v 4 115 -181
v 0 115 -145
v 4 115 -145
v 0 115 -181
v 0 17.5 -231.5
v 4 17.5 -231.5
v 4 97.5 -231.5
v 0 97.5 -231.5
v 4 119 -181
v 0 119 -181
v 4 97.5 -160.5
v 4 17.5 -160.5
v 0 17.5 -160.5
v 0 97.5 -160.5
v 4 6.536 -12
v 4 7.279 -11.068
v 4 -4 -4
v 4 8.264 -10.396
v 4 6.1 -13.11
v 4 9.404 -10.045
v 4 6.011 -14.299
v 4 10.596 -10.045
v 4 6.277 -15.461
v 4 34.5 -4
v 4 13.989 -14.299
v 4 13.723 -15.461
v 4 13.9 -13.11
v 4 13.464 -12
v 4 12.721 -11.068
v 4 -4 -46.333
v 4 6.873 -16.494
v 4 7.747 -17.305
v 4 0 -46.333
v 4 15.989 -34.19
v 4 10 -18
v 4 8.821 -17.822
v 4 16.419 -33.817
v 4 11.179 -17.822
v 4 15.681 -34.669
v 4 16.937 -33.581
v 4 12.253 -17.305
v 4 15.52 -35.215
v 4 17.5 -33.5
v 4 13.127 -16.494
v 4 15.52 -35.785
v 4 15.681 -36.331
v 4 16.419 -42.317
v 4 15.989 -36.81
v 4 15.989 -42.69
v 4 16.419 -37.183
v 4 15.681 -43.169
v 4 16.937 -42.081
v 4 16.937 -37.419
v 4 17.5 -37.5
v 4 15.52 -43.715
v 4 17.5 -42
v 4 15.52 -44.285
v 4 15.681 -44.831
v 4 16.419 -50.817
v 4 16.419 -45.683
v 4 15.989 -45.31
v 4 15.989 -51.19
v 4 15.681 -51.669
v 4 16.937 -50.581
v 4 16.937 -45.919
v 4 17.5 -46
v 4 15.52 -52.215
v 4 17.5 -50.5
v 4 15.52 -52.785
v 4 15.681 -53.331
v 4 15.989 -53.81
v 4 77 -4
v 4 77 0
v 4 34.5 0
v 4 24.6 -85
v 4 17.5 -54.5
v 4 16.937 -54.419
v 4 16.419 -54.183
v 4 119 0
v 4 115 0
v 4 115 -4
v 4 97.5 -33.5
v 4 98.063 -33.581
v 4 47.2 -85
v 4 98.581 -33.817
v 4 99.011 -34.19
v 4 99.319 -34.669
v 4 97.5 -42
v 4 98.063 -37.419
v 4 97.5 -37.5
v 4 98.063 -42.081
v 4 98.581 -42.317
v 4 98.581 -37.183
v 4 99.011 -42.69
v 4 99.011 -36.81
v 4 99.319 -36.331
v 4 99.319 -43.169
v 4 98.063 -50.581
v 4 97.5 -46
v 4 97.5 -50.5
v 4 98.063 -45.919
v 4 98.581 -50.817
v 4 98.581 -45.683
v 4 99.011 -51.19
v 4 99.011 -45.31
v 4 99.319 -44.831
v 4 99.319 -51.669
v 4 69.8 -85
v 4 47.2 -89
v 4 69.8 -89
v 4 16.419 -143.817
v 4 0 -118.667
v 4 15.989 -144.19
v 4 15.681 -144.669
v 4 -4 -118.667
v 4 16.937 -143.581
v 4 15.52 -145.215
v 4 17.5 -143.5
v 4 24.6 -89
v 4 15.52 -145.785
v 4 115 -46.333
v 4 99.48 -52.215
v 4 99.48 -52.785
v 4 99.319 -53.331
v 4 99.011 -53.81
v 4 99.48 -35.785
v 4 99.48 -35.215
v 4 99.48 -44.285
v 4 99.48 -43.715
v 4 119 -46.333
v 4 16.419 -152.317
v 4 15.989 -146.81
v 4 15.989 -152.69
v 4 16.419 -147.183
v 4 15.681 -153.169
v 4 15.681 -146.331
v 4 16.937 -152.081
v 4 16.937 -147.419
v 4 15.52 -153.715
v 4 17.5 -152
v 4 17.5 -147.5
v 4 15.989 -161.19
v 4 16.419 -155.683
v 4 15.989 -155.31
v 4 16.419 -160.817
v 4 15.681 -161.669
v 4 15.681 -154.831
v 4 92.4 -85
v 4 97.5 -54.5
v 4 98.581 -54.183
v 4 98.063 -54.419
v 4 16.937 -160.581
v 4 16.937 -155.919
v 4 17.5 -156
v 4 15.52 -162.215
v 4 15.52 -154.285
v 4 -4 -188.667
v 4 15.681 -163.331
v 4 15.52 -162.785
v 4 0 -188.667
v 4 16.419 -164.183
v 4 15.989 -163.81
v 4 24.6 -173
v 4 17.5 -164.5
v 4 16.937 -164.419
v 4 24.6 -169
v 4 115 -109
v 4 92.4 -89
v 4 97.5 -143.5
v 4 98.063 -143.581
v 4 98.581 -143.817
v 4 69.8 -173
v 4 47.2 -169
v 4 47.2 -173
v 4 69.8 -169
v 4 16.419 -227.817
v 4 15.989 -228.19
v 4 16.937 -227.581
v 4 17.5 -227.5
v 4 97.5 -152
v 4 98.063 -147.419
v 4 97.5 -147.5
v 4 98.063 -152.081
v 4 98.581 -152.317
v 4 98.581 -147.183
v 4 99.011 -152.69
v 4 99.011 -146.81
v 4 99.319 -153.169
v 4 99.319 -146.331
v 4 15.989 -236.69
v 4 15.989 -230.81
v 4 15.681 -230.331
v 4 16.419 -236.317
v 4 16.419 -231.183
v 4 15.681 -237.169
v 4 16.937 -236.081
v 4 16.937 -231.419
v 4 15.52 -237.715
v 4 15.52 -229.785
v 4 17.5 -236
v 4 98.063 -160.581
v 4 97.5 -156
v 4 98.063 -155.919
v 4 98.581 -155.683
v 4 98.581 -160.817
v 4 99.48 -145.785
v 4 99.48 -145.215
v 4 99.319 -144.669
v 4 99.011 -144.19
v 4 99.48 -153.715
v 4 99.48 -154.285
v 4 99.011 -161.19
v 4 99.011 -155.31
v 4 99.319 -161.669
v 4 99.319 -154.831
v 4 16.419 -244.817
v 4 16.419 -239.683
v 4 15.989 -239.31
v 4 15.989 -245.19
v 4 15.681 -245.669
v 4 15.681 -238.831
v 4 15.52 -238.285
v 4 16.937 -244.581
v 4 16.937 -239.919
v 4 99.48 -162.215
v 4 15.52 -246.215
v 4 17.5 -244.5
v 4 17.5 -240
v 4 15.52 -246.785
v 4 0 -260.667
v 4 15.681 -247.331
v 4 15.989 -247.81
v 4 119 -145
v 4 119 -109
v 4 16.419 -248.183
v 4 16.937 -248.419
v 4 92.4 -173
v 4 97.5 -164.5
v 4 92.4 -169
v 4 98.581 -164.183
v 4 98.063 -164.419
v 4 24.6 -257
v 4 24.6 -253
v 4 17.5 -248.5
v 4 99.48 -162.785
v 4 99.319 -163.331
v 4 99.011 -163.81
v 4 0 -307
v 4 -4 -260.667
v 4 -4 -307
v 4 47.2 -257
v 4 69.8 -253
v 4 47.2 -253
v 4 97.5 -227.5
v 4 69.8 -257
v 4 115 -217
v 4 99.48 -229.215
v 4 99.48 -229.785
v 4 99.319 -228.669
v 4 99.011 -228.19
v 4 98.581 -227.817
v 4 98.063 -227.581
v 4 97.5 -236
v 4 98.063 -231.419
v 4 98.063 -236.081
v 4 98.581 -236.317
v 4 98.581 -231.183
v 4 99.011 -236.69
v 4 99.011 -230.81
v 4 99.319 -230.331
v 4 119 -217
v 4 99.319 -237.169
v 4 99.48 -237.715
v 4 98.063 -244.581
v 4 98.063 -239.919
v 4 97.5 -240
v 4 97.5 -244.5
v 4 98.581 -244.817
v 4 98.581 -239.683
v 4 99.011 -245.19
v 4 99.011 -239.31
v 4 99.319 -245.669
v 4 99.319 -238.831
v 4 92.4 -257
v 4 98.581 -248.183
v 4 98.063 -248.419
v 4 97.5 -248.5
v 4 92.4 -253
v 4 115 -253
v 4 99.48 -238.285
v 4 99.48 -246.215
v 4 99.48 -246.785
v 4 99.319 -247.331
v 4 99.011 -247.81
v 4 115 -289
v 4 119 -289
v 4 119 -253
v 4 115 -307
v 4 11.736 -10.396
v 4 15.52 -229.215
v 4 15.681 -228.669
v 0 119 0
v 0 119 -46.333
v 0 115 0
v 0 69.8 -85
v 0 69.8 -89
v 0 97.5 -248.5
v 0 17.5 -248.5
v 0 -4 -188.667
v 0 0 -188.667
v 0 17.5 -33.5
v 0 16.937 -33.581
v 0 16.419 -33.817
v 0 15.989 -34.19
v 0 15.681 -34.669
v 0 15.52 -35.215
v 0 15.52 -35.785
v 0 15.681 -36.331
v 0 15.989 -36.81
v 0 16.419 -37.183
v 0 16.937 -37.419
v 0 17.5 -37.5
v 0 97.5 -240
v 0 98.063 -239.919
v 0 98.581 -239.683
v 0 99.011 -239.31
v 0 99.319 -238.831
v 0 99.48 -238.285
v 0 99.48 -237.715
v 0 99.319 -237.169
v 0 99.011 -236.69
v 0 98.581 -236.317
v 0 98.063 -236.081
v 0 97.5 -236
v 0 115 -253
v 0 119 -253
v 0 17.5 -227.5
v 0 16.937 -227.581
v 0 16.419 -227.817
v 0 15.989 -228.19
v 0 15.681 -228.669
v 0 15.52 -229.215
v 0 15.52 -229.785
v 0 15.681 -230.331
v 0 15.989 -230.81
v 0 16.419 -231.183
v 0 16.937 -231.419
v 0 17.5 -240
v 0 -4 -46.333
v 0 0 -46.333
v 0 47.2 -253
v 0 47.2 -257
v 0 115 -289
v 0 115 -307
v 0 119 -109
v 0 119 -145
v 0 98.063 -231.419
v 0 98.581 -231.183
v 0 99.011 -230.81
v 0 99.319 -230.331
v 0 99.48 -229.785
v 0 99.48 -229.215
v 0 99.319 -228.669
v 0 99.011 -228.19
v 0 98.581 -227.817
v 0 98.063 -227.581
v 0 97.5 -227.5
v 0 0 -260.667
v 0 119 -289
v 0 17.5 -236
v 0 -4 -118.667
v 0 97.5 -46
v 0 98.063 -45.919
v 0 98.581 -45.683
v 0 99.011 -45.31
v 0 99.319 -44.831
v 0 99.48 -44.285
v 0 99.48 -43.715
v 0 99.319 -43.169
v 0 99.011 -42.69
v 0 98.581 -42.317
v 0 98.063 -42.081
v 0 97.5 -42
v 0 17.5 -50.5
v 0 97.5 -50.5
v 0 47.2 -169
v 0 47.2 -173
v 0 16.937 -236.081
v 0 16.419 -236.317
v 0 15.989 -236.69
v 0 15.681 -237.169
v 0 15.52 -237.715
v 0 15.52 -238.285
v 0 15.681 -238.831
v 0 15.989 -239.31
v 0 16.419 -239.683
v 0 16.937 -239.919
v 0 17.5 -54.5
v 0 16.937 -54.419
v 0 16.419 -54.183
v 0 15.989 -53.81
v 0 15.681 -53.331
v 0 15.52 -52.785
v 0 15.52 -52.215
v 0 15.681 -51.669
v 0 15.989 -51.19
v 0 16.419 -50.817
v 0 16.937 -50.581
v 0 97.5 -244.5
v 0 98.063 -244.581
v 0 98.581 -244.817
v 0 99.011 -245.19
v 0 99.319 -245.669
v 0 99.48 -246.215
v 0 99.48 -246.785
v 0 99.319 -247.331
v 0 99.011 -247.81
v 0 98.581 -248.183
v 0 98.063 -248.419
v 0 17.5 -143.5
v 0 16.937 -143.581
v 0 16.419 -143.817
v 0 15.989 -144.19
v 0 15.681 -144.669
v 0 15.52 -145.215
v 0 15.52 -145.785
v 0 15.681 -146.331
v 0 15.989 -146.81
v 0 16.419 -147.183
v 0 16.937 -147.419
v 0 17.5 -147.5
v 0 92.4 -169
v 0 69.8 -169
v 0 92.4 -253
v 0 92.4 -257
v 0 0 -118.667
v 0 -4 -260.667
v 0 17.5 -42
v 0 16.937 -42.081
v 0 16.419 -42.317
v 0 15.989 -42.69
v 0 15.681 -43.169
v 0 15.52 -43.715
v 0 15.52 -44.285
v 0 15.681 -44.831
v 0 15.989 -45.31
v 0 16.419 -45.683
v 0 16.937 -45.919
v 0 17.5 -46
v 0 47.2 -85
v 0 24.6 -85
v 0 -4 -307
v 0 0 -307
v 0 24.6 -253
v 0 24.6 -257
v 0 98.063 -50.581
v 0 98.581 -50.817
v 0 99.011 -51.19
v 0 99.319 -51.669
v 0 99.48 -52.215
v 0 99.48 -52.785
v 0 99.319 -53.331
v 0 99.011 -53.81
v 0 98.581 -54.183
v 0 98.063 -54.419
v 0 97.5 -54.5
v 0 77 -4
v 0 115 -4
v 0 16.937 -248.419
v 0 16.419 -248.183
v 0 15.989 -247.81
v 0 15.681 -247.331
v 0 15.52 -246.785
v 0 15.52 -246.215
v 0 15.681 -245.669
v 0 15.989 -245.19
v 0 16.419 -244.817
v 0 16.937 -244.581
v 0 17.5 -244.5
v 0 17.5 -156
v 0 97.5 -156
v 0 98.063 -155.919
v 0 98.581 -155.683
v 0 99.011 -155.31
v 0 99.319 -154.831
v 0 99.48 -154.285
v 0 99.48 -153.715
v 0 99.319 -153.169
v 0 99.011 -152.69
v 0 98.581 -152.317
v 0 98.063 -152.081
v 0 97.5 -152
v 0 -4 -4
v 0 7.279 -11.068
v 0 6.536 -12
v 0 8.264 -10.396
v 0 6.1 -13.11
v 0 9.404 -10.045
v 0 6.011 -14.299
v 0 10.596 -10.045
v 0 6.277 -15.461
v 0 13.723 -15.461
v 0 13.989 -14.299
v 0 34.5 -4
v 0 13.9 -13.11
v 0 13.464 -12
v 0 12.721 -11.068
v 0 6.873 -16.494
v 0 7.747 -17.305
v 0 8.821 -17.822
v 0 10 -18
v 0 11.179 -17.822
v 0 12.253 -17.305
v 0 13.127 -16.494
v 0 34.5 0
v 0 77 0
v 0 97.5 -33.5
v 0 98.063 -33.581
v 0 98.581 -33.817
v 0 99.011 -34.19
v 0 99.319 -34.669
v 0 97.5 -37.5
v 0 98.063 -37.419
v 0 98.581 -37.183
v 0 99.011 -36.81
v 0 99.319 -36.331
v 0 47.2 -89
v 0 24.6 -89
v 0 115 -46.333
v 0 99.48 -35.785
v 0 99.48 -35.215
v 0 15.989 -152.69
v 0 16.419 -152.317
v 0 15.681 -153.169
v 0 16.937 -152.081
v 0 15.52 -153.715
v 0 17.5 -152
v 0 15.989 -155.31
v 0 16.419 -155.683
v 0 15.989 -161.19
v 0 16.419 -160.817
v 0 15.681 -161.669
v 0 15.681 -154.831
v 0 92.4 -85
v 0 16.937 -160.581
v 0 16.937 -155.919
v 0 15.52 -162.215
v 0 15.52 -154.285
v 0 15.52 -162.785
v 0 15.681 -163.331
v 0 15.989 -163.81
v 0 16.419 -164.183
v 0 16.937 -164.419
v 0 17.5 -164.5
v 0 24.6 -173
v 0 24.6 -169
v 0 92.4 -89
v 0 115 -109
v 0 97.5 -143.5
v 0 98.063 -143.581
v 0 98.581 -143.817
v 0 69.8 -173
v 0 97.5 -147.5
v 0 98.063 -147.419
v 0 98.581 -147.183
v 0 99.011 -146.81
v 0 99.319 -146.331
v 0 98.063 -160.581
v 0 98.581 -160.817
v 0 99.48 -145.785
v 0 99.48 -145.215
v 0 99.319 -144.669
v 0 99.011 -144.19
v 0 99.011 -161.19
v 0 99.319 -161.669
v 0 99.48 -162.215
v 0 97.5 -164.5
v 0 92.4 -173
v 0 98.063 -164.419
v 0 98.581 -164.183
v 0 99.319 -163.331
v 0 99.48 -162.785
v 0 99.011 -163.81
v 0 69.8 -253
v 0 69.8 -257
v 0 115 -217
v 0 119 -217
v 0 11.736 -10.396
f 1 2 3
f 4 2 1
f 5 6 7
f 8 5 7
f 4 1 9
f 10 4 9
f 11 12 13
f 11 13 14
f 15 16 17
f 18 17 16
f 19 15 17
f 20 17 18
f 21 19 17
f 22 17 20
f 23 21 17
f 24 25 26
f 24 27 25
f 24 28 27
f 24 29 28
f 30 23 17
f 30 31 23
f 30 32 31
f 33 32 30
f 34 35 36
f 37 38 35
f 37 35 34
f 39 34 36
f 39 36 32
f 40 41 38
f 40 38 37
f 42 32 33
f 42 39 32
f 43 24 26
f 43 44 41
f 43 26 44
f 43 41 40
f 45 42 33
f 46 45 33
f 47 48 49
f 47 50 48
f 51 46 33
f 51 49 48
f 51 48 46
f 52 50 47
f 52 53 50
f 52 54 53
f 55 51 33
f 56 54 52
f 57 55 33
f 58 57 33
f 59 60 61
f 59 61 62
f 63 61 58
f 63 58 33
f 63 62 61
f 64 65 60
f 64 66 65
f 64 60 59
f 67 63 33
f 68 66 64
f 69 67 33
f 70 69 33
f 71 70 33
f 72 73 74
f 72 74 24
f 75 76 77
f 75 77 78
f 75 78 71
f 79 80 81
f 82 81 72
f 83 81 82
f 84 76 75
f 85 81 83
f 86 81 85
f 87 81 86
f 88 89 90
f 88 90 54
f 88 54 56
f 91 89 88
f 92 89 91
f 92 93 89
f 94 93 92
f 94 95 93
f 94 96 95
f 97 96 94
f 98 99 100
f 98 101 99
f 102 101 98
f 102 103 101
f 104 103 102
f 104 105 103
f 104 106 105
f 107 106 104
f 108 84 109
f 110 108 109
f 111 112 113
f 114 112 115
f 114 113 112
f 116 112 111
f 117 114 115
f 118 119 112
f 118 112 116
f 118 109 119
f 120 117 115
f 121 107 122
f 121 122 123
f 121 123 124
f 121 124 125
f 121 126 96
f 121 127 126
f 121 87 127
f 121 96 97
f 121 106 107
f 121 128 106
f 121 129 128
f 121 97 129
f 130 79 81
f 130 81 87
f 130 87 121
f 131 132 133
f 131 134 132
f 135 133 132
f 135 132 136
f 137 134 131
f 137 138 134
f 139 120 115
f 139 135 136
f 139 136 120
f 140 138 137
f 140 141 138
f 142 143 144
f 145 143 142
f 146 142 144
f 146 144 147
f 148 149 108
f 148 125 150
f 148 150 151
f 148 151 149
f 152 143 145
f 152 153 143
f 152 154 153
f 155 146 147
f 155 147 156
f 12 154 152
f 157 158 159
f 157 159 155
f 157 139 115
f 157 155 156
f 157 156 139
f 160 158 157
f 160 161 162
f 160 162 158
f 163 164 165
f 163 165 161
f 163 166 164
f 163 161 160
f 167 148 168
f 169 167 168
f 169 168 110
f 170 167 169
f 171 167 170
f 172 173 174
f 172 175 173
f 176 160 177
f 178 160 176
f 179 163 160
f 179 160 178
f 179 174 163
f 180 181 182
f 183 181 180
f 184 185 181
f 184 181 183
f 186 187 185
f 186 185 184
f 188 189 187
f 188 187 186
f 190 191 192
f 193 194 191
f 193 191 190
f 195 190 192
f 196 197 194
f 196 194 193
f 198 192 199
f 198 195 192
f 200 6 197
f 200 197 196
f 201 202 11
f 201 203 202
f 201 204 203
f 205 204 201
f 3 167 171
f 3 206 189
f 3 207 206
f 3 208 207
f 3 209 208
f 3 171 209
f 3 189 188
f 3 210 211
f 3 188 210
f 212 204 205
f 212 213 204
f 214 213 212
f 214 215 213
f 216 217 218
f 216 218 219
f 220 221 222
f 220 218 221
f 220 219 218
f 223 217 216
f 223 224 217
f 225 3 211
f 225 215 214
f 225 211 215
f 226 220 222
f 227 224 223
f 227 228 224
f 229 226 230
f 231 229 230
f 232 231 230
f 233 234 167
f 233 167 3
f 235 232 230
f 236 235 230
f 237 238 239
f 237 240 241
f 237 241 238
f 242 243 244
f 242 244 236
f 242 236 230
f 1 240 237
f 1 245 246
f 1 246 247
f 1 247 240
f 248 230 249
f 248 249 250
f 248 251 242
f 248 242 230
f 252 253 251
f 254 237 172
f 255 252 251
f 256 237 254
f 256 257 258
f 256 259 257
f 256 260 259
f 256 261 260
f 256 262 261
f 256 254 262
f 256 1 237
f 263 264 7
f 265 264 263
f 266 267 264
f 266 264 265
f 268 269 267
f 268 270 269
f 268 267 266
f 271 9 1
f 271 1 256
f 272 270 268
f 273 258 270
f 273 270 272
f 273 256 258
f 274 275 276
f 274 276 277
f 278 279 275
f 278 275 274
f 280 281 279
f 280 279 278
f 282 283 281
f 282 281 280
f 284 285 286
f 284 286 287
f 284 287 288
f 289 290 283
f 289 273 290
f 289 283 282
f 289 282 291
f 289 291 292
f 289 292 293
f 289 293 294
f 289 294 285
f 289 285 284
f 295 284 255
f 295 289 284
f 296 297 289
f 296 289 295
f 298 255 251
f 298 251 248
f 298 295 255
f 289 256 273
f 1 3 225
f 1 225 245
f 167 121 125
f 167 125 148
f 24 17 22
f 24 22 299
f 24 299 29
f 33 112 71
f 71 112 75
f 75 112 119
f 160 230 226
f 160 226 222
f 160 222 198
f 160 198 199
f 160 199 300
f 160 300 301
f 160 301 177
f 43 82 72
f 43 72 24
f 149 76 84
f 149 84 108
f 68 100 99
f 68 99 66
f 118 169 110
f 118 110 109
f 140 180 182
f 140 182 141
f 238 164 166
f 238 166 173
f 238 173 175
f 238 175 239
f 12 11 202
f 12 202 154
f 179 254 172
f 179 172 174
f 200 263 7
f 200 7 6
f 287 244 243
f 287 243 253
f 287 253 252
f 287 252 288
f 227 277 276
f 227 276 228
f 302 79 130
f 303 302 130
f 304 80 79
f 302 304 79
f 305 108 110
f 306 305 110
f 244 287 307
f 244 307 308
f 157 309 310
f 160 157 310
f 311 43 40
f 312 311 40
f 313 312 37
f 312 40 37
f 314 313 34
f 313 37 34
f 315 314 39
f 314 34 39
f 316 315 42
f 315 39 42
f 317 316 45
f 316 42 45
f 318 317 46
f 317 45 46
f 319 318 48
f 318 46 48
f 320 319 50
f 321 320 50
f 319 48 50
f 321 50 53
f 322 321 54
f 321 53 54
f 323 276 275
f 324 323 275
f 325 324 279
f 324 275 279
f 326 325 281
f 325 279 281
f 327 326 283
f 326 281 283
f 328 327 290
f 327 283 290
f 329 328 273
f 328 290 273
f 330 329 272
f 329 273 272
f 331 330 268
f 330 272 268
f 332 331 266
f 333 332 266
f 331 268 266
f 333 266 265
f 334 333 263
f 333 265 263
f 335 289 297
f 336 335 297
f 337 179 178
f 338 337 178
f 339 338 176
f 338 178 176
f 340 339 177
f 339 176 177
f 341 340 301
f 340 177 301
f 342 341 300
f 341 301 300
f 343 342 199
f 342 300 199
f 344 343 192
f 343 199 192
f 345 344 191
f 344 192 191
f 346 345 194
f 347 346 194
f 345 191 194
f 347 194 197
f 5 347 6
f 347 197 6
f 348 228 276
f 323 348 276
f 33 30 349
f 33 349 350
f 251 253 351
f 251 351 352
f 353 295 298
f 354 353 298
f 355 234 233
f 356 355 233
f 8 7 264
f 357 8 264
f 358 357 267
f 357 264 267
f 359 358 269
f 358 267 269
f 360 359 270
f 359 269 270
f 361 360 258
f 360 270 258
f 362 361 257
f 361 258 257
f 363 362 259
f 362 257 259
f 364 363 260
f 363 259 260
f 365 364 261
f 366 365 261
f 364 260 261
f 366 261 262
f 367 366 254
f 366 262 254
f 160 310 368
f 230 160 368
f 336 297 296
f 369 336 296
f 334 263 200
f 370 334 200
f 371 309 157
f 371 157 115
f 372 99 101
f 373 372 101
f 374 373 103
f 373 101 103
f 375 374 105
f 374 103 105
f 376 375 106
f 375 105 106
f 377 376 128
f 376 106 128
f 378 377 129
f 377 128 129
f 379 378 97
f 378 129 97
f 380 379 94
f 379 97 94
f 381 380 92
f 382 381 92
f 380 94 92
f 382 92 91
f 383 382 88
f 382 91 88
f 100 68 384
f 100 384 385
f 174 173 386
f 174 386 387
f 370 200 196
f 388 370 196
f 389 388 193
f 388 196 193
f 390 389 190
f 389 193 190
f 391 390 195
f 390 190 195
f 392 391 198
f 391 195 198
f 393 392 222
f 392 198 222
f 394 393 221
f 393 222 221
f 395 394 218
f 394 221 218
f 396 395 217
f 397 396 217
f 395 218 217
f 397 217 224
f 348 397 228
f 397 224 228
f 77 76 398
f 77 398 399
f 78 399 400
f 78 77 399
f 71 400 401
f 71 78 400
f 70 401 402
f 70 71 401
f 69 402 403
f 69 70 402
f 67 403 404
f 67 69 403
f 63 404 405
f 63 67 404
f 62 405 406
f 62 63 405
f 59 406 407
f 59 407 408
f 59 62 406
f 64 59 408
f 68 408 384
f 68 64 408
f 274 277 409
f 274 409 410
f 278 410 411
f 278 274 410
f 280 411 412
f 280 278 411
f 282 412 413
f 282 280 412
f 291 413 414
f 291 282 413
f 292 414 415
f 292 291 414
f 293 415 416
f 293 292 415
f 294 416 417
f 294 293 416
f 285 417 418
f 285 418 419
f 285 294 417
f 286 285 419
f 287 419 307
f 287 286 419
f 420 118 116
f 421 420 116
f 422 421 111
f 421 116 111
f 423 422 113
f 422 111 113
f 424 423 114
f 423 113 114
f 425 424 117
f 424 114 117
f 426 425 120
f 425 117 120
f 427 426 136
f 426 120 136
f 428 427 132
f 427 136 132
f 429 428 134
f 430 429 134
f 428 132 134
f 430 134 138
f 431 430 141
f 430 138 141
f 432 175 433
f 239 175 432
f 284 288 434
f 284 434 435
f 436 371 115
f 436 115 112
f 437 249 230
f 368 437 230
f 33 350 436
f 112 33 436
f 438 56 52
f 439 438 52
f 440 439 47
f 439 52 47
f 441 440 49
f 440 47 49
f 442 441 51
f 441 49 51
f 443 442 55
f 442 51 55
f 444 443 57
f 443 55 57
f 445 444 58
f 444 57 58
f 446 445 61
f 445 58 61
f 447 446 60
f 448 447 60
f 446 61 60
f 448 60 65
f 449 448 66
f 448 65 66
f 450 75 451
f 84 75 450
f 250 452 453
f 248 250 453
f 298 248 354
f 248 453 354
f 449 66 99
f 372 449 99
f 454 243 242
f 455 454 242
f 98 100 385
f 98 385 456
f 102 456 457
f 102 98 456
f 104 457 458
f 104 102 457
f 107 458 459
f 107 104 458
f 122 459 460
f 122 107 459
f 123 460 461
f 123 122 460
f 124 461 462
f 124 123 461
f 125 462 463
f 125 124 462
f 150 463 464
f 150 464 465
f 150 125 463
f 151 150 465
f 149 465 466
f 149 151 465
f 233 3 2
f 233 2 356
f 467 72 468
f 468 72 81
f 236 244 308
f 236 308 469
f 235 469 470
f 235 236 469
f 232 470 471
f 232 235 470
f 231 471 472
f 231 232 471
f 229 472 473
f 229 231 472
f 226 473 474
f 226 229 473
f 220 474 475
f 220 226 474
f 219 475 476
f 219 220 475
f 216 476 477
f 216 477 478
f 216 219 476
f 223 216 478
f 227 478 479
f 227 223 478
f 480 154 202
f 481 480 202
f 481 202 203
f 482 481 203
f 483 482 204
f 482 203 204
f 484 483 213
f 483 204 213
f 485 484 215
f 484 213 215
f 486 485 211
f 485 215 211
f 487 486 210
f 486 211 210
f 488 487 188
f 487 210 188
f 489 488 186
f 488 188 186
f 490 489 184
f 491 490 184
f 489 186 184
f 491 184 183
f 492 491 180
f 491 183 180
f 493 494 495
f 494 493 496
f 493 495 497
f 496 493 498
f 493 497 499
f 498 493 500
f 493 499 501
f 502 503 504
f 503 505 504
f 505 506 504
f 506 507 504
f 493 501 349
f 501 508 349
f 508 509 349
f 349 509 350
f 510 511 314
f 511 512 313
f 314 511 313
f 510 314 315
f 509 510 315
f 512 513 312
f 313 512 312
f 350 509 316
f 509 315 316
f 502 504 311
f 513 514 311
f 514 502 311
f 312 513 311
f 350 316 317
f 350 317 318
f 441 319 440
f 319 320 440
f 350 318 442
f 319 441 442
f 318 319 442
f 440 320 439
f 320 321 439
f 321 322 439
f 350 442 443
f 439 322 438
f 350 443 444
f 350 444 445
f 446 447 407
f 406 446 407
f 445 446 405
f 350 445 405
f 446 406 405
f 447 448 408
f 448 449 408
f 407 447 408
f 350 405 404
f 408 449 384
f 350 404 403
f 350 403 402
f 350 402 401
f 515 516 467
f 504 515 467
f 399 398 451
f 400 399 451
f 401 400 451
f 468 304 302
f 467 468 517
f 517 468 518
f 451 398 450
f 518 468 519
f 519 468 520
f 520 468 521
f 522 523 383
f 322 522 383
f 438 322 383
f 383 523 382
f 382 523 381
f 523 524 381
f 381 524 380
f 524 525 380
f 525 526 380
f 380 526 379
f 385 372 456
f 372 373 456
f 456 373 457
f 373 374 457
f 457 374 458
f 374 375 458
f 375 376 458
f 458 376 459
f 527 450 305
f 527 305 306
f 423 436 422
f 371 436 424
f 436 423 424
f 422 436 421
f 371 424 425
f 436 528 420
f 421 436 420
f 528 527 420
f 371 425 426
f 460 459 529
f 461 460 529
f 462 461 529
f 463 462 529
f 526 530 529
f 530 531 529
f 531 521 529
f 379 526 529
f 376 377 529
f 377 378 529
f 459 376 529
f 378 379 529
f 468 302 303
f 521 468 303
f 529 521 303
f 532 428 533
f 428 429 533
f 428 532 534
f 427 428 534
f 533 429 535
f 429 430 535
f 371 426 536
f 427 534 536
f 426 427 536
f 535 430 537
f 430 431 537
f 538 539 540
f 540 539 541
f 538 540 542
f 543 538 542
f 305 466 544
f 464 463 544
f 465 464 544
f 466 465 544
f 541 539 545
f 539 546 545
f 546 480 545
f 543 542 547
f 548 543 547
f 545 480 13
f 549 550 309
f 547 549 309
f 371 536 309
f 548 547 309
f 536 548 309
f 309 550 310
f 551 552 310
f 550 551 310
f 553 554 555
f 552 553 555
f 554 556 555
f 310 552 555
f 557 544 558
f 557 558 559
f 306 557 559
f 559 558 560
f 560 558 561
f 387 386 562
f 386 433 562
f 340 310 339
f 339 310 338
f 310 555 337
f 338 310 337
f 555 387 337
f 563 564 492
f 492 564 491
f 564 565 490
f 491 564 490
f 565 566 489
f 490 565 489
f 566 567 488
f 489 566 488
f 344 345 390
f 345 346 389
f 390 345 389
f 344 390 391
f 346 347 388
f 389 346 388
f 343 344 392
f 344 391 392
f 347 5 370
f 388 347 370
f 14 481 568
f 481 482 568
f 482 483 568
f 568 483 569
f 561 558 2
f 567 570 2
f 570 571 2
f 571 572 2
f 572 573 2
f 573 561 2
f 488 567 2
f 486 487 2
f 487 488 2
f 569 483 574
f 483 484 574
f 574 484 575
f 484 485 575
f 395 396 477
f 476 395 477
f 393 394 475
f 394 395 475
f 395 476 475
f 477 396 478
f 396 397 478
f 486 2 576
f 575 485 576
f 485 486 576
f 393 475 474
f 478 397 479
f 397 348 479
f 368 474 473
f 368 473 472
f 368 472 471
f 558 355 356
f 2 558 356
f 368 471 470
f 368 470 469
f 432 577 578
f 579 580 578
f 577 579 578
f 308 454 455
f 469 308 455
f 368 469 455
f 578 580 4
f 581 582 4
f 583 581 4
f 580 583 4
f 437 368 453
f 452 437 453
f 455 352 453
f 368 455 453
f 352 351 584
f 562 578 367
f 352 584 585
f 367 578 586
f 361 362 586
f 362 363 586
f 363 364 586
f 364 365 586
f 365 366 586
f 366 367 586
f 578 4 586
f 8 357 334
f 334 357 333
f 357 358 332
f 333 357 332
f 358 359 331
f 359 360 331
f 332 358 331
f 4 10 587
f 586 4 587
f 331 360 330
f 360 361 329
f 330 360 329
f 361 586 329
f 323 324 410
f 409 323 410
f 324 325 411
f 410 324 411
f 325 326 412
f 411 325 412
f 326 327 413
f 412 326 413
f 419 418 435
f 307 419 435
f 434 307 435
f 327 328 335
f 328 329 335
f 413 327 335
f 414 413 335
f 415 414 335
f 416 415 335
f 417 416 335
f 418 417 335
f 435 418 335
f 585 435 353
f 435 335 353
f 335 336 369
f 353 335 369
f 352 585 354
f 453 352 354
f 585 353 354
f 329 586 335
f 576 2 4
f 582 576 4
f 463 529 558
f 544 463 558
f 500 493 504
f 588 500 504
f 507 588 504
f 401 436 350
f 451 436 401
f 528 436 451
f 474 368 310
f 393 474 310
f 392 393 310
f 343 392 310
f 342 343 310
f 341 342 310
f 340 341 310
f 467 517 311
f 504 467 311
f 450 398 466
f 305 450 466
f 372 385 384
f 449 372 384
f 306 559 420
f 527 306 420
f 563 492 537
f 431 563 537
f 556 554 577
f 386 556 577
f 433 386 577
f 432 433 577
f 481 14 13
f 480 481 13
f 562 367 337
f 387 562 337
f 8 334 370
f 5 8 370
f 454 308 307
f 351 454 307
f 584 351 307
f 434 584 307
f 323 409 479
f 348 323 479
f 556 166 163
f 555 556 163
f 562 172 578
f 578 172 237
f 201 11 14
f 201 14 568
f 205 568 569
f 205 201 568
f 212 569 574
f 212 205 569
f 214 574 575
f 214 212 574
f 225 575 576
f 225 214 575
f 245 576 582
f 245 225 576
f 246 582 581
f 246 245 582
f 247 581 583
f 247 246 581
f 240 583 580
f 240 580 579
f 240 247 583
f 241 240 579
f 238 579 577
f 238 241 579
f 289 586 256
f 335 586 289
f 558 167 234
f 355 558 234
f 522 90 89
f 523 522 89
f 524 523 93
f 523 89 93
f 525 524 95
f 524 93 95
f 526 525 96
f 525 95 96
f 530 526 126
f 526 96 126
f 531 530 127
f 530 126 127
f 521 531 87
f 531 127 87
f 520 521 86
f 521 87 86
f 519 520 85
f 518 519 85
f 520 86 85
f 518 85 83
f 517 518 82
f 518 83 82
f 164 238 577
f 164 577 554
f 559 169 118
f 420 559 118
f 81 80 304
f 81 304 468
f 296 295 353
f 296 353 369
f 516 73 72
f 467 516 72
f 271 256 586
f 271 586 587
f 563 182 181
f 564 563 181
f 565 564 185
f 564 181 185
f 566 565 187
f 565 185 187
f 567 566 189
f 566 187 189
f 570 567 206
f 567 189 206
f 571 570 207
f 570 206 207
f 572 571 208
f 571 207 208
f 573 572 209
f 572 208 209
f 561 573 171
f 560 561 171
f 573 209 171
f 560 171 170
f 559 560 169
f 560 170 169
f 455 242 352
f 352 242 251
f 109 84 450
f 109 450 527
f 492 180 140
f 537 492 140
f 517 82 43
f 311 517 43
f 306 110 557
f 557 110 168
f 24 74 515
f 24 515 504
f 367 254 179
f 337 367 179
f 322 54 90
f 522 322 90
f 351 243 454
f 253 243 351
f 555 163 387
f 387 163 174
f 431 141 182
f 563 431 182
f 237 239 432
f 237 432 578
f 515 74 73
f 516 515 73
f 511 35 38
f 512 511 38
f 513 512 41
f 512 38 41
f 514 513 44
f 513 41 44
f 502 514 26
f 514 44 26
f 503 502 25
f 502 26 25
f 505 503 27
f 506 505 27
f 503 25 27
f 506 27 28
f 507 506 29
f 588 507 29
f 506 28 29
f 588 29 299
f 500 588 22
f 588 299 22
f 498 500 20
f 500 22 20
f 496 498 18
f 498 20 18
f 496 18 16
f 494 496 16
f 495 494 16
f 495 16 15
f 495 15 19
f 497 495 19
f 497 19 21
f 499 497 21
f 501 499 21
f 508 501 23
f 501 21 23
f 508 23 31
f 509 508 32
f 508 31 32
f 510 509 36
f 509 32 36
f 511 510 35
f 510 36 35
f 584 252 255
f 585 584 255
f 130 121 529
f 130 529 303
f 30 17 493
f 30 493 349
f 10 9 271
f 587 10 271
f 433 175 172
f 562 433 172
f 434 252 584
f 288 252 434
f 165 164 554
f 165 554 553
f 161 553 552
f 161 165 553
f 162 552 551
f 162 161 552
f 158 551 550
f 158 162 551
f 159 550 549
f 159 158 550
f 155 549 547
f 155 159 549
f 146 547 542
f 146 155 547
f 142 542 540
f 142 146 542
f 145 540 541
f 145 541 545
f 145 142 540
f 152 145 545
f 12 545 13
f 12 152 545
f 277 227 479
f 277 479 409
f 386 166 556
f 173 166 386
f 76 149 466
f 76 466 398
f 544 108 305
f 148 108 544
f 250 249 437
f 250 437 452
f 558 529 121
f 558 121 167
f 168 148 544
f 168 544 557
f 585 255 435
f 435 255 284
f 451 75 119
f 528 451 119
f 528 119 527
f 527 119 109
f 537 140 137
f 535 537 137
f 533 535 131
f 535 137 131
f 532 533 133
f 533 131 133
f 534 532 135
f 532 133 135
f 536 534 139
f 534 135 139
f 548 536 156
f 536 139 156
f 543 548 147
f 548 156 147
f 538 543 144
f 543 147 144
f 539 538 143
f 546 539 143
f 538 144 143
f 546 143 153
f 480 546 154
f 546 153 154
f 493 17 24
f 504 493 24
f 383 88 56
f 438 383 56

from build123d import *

# Parameters (mm, degrees)
SKETCH1_W           = 307
SKETCH1_H           = 115
BOSS_EXTRUDE1_DEPTH = 4
SKETCH2_W           = 46.333333333
SKETCH2_H           = 4
BOSS_EXTRUDE2_DEPTH = 4
SKETCH3_W           = 4
SKETCH3_H           = 38
SKETCH3_H_2         = 38.5
CUT_EXTRUDE1_DEPTH  = 4
SKETCH4_W           = 4
SKETCH4_H           = 22.6
CUT_EXTRUDE2_DEPTH  = 328.856676003
SKETCH5_R           = 4
CUT_EXTRUDE3_DEPTH  = 4
LPATTERN2_COUNT     = 3
LPATTERN2_PITCH     = 84
SKETCH6_W           = 70
SKETCH6_H           = 4
BOSS_EXTRUDE3_DEPTH = 4
LPATTERN1_COUNT     = 2
LPATTERN1_PITCH     = 119
SKETCH7_W           = 18
SKETCH7_H           = 4
CUT_EXTRUDE4_DEPTH  = 4
SKETCH8_W           = 36
SKETCH8_H           = 4
BOSS_EXTRUDE5_DEPTH = 4
CUT_EXTRUDE5_DEPTH  = 4
LPATTERN3_COUNT     = 3
LPATTERN3_PITCH     = 84
LPATTERN4_COUNT     = 2
LPATTERN4_PITCH     = 110


with BuildPart() as part:
    # Sketch1 → Boss-Extrude1 (new body)
    with BuildSketch(Plane(origin=(0, 0, 0), x_dir=(0, 0, -1), z_dir=(1, 0, 0))):
        with Locations((153.5, 57.5)):
            Rectangle(SKETCH1_W, SKETCH1_H)
    extrude(amount=BOSS_EXTRUDE1_DEPTH)

    # Sketch2 → Boss-Extrude2 (add)
    with BuildSketch(Plane(origin=(4, 0, 0), x_dir=(0, 0, -1), z_dir=(1, 0, 0))):
        with Locations((23.166666667, -2)):
            Rectangle(SKETCH2_W, SKETCH2_H)
        with Locations((283.833333334, -2)):
            Rectangle(SKETCH2_W, SKETCH2_H)
    boss_extrude2 = extrude(amount=-BOSS_EXTRUDE2_DEPTH)

    # Sketch3 → Cut-Extrude1 (cut)
    with BuildSketch(Plane(origin=(4, 0, 0), x_dir=(0, 0, -1), z_dir=(1, 0, 0))):
        with Locations((2, 96)):
            Rectangle(SKETCH3_W, SKETCH3_H)
        with Locations((2, 15.25)):
            Rectangle(SKETCH3_W, SKETCH3_H_2)
    extrude(amount=-CUT_EXTRUDE1_DEPTH, mode=Mode.SUBTRACT)

    # Sketch4 → Cut-Extrude2 (cut, through all)
    with BuildSketch(Plane(origin=(4, 0, 0), x_dir=(0, 0, -1), z_dir=(1, 0, 0))):
        with Locations((255, 81.1)):
            Rectangle(SKETCH4_W, SKETCH4_H)
        with Locations((255, 35.9)):
            Rectangle(SKETCH4_W, SKETCH4_H)
    cut_extrude2 = extrude(amount=-CUT_EXTRUDE2_DEPTH, mode=Mode.SUBTRACT)

    # Sketch5 → Cut-Extrude3 (cut)
    with BuildSketch(Plane(origin=(4, 0, 0), x_dir=(0, 0, -1), z_dir=(1, 0, 0))):
        with Locations((14, 10)):
            Circle(SKETCH5_R)
    extrude(amount=-CUT_EXTRUDE3_DEPTH, mode=Mode.SUBTRACT)

    # LPattern2: Cut-Extrude2 ×3
    with Locations(*[(0, 0, i * LPATTERN2_PITCH) for i in range(1, LPATTERN2_COUNT)]):
        add(cut_extrude2, mode=Mode.SUBTRACT)

    # Sketch6 → Boss-Extrude3 (add)
    with BuildSketch(Plane.ZY):
        with Locations((-153.666666667, -2)):
            Rectangle(SKETCH6_W, SKETCH6_H)
    extrude(amount=-BOSS_EXTRUDE3_DEPTH)

    # LPattern1: Boss-Extrude2 ×2
    with Locations(*[(0, i * LPATTERN1_PITCH, 0) for i in range(1, LPATTERN1_COUNT)]):
        add(boss_extrude2)

    # Sketch7 → Cut-Extrude4 (cut)
    with BuildSketch(Plane(origin=(4, 0, 0), x_dir=(0, 0, -1), z_dir=(1, 0, 0))):
        with Locations((298, 117)):
            Rectangle(SKETCH7_W, SKETCH7_H)
    extrude(amount=-CUT_EXTRUDE4_DEPTH, mode=Mode.SUBTRACT)

    # Sketch8 → Boss-Extrude5 (add)
    with BuildSketch(Plane(origin=(4, 0, 0), x_dir=(0, 0, -1), z_dir=(1, 0, 0))):
        with Locations((271, 117)):
            Rectangle(SKETCH8_W, SKETCH8_H)
        with Locations((199, 117)):
            Rectangle(SKETCH8_W, SKETCH8_H)
        with Locations((127, 117)):
            Rectangle(SKETCH8_W, SKETCH8_H)
    extrude(amount=-BOSS_EXTRUDE5_DEPTH)

    # Sketch9 → Cut-Extrude5 (cut)
    with BuildSketch(Plane(origin=(4, 0, 0), x_dir=(0, 0, -1), z_dir=(1, 0, 0))):
        with BuildLine():
            Line((164.5, 97.5), (164.5, 17.5))
            ThreePointArc((164.5, 17.5), (162.5, 15.5), (160.5, 17.5))
            Line((160.5, 17.5), (160.5, 97.5))
            ThreePointArc((160.5, 97.5), (162.5, 99.5), (164.5, 97.5))
        make_face()
        with BuildLine():
            Line((152, 97.5), (152, 17.5))
            ThreePointArc((152, 17.5), (154, 15.5), (156, 17.5))
            Line((156, 17.5), (156, 97.5))
            ThreePointArc((156, 97.5), (154, 99.5), (152, 97.5))
        make_face()
        with BuildLine():
            Line((143.5, 97.5), (143.5, 17.5))
            ThreePointArc((143.5, 17.5), (145.5, 15.5), (147.5, 17.5))
            Line((147.5, 17.5), (147.5, 97.5))
            ThreePointArc((147.5, 97.5), (145.5, 99.5), (143.5, 97.5))
        make_face()
    cut_extrude5 = extrude(amount=-CUT_EXTRUDE5_DEPTH, mode=Mode.SUBTRACT)

    # LPattern3: Cut-Extrude5 ×3
    with Locations(*[(0, 0, -i * LPATTERN3_PITCH) for i in range(1, LPATTERN3_COUNT)]):
        add(cut_extrude5, mode=Mode.SUBTRACT)

    # LPattern4: Cut-Extrude5 ×2
    with Locations(*[(0, 0, i * LPATTERN4_PITCH) for i in range(1, LPATTERN4_COUNT)]):
        add(cut_extrude5, mode=Mode.SUBTRACT)


solid = part.part
